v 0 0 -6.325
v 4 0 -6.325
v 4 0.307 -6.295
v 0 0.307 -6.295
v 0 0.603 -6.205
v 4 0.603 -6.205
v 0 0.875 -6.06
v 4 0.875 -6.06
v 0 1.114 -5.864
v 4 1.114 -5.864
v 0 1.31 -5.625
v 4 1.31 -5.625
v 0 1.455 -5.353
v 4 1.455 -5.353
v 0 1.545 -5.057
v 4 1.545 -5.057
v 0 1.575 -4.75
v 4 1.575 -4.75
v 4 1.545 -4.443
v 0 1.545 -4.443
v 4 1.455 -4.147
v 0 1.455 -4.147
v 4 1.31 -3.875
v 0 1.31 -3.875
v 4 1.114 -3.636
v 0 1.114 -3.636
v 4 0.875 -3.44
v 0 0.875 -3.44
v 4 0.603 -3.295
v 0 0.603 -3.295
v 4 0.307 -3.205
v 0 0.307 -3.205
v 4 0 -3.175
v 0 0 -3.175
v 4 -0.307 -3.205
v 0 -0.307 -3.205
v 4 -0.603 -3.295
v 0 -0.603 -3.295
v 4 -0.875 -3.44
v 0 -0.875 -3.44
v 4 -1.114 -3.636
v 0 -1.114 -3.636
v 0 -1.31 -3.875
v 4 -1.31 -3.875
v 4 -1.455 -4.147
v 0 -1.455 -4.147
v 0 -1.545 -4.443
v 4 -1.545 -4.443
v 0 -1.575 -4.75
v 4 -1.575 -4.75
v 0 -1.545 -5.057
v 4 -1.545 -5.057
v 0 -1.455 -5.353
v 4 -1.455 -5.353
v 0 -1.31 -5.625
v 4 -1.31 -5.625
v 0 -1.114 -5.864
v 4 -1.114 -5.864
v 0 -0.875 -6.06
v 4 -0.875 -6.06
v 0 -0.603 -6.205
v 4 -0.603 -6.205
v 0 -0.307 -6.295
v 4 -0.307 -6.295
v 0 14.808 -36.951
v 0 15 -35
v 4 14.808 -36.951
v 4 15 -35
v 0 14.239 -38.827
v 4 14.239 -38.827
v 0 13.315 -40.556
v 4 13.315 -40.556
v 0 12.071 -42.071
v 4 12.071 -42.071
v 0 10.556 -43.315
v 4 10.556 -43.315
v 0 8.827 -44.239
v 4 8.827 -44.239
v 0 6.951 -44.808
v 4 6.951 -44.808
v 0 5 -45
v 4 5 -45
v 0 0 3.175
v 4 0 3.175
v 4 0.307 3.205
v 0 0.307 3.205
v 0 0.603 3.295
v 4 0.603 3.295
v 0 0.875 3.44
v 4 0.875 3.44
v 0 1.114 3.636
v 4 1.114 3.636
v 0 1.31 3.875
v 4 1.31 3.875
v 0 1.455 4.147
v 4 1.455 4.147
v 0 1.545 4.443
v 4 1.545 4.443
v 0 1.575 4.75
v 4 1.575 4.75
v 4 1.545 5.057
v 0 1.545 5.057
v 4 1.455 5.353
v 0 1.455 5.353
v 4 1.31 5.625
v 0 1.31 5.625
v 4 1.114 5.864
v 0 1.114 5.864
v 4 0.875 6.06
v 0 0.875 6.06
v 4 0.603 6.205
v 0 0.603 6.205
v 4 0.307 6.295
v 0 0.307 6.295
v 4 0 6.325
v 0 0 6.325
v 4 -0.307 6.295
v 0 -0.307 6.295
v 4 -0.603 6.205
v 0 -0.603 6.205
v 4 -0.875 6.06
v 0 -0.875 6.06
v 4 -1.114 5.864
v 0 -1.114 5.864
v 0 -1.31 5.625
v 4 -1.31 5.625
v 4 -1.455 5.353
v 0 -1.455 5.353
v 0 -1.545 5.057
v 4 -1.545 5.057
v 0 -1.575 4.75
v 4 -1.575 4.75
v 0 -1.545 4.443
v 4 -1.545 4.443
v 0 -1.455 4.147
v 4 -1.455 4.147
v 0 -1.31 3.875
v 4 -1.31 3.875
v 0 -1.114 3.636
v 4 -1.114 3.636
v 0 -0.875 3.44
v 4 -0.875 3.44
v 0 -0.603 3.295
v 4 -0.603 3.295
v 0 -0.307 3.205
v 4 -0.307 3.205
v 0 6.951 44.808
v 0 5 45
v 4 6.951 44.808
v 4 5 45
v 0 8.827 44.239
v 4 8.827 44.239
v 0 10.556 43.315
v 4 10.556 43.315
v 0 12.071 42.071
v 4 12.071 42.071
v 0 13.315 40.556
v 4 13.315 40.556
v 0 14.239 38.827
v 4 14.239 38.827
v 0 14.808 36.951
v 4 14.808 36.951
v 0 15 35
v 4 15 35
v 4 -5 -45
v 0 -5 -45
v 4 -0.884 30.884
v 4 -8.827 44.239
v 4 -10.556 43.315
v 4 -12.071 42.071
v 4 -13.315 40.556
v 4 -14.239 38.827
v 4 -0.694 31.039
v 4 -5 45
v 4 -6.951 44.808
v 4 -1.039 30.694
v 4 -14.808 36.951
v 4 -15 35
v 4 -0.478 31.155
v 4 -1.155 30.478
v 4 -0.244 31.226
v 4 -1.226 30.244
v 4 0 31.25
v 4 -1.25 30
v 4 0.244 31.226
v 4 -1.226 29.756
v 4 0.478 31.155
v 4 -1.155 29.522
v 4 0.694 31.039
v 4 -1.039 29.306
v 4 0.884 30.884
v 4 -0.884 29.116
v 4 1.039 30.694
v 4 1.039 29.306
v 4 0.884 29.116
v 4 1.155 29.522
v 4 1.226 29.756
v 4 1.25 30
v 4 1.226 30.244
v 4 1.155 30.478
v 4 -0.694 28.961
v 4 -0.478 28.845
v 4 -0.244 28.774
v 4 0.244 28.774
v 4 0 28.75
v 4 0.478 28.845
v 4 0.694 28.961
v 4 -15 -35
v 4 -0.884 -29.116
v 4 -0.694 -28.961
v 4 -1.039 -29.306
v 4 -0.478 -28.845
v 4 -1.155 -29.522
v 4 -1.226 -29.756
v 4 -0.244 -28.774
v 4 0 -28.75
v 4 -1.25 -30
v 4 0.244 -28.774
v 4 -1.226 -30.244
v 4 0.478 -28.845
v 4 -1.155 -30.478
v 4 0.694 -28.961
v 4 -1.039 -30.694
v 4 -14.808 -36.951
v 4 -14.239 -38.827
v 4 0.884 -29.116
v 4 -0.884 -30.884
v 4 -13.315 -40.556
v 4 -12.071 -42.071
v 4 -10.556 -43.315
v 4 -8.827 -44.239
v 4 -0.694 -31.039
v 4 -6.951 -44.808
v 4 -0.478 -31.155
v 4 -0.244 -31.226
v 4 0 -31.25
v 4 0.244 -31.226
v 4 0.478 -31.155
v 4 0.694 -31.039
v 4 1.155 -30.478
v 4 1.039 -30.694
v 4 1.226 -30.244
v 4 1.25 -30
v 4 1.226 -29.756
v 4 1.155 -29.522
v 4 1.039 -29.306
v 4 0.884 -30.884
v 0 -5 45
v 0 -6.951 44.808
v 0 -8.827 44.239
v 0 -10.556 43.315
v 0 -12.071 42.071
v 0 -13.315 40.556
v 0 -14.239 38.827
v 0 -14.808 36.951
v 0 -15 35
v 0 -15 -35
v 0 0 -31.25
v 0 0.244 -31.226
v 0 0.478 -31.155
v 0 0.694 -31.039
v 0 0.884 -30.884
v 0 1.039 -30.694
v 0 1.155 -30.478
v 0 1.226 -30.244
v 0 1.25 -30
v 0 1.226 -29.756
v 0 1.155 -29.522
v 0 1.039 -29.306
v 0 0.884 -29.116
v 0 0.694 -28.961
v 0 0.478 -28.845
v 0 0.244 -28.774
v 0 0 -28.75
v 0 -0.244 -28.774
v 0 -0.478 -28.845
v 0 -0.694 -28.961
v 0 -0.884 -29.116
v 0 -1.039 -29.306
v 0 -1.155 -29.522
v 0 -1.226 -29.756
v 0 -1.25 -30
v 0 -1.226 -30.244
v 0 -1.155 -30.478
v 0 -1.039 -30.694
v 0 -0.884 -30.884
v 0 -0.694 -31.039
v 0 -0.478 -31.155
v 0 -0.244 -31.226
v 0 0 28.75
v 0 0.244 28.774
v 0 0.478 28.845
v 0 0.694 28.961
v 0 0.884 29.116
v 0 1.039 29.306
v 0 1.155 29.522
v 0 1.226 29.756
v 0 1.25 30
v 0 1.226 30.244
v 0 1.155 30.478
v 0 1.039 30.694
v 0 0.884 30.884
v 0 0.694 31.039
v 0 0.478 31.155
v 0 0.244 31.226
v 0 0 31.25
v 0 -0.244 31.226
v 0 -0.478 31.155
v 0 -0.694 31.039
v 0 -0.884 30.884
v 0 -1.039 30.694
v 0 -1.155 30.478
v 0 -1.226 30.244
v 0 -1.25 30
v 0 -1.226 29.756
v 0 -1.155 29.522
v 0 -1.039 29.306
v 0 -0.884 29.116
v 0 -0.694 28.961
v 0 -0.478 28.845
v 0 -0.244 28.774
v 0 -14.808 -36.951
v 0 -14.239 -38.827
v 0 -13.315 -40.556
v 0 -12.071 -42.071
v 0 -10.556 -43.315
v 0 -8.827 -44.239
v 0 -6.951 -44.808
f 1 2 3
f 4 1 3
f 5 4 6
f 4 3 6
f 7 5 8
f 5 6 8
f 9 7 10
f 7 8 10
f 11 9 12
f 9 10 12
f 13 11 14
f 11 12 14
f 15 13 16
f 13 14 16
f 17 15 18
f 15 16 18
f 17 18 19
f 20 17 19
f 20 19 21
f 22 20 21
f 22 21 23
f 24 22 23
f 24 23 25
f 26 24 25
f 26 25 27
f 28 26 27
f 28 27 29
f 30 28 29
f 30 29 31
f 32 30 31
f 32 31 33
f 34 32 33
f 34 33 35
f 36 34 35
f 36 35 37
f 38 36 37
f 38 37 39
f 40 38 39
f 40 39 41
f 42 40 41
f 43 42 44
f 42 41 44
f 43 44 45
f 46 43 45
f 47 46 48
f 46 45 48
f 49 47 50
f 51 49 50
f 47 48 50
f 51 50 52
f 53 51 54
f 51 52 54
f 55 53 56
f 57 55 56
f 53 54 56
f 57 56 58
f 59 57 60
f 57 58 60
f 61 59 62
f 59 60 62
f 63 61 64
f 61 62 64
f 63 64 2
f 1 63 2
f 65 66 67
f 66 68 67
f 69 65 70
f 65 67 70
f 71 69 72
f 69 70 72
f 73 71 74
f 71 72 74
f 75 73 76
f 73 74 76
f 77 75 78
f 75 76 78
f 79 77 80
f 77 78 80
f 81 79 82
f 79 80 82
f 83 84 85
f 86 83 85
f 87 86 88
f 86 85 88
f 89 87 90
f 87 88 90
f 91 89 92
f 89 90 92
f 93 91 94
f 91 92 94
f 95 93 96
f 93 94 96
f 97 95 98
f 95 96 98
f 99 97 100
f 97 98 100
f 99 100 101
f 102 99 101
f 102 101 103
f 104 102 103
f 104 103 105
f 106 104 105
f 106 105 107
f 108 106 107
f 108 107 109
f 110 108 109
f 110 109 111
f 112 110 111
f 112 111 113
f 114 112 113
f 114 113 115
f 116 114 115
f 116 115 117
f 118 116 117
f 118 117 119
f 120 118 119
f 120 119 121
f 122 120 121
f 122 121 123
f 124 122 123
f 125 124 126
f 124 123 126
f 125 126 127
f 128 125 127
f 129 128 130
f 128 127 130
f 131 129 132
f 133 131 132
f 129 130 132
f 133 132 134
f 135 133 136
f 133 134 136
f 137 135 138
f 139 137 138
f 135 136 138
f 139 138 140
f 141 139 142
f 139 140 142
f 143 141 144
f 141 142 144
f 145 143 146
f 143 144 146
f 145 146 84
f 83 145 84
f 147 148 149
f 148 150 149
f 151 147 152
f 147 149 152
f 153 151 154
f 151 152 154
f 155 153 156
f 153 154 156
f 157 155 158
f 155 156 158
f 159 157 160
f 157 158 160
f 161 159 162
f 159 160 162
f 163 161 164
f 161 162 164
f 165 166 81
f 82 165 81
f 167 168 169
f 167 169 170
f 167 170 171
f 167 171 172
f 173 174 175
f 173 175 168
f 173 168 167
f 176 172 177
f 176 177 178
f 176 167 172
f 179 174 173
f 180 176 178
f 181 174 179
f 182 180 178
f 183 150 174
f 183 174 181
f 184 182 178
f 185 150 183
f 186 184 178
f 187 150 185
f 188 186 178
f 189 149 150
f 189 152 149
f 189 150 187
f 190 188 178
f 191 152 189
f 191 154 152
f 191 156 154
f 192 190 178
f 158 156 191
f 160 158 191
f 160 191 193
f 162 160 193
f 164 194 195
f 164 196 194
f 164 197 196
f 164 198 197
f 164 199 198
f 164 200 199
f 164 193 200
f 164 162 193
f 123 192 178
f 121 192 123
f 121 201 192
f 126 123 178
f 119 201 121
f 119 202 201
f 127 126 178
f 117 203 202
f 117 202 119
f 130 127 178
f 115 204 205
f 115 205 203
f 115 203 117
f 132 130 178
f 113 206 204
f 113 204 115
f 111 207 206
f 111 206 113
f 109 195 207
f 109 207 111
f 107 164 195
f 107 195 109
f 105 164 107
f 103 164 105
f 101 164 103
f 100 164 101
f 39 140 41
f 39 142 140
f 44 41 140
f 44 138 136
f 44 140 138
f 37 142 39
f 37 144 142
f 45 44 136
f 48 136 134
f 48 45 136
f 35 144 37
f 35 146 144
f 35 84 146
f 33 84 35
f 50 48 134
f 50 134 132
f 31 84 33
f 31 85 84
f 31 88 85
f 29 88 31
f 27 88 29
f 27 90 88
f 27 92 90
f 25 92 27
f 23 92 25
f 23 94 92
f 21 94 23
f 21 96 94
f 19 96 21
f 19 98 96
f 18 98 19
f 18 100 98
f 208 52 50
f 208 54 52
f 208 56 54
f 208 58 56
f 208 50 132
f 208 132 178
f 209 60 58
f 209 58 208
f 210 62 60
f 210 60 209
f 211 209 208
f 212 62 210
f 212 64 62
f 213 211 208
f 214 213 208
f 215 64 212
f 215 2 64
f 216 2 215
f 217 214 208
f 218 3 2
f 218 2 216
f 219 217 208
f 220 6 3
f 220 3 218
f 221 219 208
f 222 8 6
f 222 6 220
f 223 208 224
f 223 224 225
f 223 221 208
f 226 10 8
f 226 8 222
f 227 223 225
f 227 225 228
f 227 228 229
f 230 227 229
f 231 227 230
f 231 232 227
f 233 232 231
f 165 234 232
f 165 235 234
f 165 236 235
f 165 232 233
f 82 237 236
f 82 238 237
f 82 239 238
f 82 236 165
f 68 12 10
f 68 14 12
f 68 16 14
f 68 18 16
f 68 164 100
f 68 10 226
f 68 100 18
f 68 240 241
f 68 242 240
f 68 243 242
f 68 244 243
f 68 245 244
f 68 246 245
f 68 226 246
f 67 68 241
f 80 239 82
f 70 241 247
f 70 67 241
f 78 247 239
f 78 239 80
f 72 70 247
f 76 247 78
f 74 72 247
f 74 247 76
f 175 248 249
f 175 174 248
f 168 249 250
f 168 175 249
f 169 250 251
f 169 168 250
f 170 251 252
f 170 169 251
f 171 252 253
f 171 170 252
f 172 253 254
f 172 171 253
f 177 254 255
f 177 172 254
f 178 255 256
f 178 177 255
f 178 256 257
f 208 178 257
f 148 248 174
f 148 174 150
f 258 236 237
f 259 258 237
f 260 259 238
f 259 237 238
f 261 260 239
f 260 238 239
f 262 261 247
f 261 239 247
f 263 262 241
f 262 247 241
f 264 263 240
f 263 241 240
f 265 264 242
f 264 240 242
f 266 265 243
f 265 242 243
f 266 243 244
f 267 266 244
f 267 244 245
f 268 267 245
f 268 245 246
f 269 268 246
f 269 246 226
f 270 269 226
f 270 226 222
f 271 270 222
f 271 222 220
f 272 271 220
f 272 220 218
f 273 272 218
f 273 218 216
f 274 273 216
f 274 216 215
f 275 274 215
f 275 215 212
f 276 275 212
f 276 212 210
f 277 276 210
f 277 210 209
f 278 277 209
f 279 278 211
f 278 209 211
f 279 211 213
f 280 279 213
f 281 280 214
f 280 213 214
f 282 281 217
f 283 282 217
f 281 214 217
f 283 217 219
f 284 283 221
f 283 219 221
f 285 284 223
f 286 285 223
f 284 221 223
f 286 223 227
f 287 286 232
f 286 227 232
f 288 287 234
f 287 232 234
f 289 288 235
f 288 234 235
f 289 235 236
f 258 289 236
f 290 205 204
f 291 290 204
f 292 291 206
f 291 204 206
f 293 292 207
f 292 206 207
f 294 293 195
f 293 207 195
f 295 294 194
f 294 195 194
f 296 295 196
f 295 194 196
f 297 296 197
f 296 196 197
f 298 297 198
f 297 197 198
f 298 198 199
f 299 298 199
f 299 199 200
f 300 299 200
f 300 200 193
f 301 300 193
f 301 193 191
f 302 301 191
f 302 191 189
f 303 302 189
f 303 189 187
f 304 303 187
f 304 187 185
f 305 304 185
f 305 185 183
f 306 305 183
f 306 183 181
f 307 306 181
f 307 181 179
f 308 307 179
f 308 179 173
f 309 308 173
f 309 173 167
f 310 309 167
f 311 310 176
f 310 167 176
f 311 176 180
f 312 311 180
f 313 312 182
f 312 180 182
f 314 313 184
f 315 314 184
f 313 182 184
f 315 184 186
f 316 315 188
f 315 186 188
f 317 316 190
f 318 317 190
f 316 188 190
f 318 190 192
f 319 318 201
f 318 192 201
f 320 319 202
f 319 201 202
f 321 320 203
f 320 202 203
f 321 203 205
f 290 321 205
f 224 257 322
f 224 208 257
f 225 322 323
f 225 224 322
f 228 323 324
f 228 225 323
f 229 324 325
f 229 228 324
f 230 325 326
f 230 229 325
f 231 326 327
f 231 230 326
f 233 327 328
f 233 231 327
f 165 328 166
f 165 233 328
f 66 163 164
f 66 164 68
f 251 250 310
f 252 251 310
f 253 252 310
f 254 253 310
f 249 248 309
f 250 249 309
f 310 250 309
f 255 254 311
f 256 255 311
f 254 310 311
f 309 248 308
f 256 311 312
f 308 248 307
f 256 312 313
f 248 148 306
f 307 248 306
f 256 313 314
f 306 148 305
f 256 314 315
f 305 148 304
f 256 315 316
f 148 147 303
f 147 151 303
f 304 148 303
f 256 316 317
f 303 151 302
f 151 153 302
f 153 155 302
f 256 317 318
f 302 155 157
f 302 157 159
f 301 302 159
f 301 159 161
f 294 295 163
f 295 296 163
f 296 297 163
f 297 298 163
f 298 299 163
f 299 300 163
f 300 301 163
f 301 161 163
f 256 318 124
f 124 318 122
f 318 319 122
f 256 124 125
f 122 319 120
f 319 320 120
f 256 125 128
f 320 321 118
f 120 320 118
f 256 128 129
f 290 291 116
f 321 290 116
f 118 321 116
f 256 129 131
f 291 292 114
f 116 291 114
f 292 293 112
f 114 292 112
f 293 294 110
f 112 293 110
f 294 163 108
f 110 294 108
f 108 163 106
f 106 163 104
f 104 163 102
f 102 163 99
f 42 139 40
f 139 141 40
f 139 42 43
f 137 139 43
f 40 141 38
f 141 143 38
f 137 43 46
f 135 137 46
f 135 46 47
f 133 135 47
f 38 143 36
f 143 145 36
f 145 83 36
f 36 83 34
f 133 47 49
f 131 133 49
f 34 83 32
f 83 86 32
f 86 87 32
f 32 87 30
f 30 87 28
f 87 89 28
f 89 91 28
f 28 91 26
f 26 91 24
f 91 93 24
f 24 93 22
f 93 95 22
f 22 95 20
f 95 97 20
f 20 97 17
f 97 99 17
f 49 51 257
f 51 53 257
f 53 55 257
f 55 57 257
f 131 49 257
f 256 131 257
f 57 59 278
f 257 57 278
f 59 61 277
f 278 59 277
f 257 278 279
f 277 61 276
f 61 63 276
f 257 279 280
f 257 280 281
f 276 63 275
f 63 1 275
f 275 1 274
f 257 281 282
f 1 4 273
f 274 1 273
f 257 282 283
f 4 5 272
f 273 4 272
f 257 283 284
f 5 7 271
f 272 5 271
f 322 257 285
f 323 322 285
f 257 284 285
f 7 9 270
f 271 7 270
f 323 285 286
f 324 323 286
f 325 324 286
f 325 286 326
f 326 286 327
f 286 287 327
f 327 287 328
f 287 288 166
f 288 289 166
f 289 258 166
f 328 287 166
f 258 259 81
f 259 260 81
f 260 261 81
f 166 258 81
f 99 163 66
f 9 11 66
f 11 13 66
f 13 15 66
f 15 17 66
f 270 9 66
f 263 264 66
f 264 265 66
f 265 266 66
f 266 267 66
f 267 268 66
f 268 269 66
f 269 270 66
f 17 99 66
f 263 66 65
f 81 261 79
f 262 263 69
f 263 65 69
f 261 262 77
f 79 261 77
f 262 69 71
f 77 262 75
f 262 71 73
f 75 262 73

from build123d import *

# Parameters (mm, degrees)
SKETCH1_W           = 90
SKETCH1_H           = 30
BOSS_EXTRUDE1_DEPTH = 4
SKETCH6_R           = 1.575
CUT_EXTRUDE6_DEPTH  = 48.602520942
SKETCH7_R           = 1.575
CUT_EXTRUDE7_DEPTH  = 48.602520942
SKETCH13_R          = 1.25
CUT_EXTRUDE13_DEPTH = 48.602520942
SKETCH14_R          = 1.25
CUT_EXTRUDE14_DEPTH = 48.602520942
FILLET1_R           = 10


with BuildPart() as part:
    # Sketch1 → Boss-Extrude1 (new body)
    with BuildSketch(Plane(origin=(0, 0, 0), x_dir=(0, 0, -1), z_dir=(1, 0, 0))):
        Rectangle(SKETCH1_W, SKETCH1_H)
    extrude(amount=BOSS_EXTRUDE1_DEPTH)

    # Sketch6 → Cut-Extrude6 (cut, through all)
    with BuildSketch(Plane(origin=(4, 0, 0), x_dir=(0, 0, -1), z_dir=(1, 0, 0))):
        with Locations((-4.75, 0)):
            Circle(SKETCH6_R)
    extrude(amount=-CUT_EXTRUDE6_DEPTH, mode=Mode.SUBTRACT)

    # Sketch7 → Cut-Extrude7 (cut, through all)
    with BuildSketch(Plane(origin=(4, 0, 0), x_dir=(0, 0, -1), z_dir=(1, 0, 0))):
        with Locations((4.75, 0)):
            Circle(SKETCH7_R)
    extrude(amount=-CUT_EXTRUDE7_DEPTH, mode=Mode.SUBTRACT)

    # Sketch13 → Cut-Extrude13 (cut, through all)
    with BuildSketch(Plane(origin=(4, 0, 0), x_dir=(0, 0, -1), z_dir=(1, 0, 0))):
        with Locations((-30, 0)):
            Circle(SKETCH13_R)
    extrude(amount=-CUT_EXTRUDE13_DEPTH, mode=Mode.SUBTRACT)

    # Sketch14 → Cut-Extrude14 (cut, through all)
    with BuildSketch(Plane(origin=(4, 0, 0), x_dir=(0, 0, -1), z_dir=(1, 0, 0))):
        with Locations((30, 0)):
            Circle(SKETCH14_R)
    extrude(amount=-CUT_EXTRUDE14_DEPTH, mode=Mode.SUBTRACT)

    # Fillet1
    fillet1_edges = [part.edges().sort_by_distance(p)[0] for p in [
        (2, -15, -45),
        (2, -15, 45),
        (2, 15, 45),
        (2, 15, -45),
    ]]
    fillet(fillet1_edges, radius=FILLET1_R)


solid = part.part
